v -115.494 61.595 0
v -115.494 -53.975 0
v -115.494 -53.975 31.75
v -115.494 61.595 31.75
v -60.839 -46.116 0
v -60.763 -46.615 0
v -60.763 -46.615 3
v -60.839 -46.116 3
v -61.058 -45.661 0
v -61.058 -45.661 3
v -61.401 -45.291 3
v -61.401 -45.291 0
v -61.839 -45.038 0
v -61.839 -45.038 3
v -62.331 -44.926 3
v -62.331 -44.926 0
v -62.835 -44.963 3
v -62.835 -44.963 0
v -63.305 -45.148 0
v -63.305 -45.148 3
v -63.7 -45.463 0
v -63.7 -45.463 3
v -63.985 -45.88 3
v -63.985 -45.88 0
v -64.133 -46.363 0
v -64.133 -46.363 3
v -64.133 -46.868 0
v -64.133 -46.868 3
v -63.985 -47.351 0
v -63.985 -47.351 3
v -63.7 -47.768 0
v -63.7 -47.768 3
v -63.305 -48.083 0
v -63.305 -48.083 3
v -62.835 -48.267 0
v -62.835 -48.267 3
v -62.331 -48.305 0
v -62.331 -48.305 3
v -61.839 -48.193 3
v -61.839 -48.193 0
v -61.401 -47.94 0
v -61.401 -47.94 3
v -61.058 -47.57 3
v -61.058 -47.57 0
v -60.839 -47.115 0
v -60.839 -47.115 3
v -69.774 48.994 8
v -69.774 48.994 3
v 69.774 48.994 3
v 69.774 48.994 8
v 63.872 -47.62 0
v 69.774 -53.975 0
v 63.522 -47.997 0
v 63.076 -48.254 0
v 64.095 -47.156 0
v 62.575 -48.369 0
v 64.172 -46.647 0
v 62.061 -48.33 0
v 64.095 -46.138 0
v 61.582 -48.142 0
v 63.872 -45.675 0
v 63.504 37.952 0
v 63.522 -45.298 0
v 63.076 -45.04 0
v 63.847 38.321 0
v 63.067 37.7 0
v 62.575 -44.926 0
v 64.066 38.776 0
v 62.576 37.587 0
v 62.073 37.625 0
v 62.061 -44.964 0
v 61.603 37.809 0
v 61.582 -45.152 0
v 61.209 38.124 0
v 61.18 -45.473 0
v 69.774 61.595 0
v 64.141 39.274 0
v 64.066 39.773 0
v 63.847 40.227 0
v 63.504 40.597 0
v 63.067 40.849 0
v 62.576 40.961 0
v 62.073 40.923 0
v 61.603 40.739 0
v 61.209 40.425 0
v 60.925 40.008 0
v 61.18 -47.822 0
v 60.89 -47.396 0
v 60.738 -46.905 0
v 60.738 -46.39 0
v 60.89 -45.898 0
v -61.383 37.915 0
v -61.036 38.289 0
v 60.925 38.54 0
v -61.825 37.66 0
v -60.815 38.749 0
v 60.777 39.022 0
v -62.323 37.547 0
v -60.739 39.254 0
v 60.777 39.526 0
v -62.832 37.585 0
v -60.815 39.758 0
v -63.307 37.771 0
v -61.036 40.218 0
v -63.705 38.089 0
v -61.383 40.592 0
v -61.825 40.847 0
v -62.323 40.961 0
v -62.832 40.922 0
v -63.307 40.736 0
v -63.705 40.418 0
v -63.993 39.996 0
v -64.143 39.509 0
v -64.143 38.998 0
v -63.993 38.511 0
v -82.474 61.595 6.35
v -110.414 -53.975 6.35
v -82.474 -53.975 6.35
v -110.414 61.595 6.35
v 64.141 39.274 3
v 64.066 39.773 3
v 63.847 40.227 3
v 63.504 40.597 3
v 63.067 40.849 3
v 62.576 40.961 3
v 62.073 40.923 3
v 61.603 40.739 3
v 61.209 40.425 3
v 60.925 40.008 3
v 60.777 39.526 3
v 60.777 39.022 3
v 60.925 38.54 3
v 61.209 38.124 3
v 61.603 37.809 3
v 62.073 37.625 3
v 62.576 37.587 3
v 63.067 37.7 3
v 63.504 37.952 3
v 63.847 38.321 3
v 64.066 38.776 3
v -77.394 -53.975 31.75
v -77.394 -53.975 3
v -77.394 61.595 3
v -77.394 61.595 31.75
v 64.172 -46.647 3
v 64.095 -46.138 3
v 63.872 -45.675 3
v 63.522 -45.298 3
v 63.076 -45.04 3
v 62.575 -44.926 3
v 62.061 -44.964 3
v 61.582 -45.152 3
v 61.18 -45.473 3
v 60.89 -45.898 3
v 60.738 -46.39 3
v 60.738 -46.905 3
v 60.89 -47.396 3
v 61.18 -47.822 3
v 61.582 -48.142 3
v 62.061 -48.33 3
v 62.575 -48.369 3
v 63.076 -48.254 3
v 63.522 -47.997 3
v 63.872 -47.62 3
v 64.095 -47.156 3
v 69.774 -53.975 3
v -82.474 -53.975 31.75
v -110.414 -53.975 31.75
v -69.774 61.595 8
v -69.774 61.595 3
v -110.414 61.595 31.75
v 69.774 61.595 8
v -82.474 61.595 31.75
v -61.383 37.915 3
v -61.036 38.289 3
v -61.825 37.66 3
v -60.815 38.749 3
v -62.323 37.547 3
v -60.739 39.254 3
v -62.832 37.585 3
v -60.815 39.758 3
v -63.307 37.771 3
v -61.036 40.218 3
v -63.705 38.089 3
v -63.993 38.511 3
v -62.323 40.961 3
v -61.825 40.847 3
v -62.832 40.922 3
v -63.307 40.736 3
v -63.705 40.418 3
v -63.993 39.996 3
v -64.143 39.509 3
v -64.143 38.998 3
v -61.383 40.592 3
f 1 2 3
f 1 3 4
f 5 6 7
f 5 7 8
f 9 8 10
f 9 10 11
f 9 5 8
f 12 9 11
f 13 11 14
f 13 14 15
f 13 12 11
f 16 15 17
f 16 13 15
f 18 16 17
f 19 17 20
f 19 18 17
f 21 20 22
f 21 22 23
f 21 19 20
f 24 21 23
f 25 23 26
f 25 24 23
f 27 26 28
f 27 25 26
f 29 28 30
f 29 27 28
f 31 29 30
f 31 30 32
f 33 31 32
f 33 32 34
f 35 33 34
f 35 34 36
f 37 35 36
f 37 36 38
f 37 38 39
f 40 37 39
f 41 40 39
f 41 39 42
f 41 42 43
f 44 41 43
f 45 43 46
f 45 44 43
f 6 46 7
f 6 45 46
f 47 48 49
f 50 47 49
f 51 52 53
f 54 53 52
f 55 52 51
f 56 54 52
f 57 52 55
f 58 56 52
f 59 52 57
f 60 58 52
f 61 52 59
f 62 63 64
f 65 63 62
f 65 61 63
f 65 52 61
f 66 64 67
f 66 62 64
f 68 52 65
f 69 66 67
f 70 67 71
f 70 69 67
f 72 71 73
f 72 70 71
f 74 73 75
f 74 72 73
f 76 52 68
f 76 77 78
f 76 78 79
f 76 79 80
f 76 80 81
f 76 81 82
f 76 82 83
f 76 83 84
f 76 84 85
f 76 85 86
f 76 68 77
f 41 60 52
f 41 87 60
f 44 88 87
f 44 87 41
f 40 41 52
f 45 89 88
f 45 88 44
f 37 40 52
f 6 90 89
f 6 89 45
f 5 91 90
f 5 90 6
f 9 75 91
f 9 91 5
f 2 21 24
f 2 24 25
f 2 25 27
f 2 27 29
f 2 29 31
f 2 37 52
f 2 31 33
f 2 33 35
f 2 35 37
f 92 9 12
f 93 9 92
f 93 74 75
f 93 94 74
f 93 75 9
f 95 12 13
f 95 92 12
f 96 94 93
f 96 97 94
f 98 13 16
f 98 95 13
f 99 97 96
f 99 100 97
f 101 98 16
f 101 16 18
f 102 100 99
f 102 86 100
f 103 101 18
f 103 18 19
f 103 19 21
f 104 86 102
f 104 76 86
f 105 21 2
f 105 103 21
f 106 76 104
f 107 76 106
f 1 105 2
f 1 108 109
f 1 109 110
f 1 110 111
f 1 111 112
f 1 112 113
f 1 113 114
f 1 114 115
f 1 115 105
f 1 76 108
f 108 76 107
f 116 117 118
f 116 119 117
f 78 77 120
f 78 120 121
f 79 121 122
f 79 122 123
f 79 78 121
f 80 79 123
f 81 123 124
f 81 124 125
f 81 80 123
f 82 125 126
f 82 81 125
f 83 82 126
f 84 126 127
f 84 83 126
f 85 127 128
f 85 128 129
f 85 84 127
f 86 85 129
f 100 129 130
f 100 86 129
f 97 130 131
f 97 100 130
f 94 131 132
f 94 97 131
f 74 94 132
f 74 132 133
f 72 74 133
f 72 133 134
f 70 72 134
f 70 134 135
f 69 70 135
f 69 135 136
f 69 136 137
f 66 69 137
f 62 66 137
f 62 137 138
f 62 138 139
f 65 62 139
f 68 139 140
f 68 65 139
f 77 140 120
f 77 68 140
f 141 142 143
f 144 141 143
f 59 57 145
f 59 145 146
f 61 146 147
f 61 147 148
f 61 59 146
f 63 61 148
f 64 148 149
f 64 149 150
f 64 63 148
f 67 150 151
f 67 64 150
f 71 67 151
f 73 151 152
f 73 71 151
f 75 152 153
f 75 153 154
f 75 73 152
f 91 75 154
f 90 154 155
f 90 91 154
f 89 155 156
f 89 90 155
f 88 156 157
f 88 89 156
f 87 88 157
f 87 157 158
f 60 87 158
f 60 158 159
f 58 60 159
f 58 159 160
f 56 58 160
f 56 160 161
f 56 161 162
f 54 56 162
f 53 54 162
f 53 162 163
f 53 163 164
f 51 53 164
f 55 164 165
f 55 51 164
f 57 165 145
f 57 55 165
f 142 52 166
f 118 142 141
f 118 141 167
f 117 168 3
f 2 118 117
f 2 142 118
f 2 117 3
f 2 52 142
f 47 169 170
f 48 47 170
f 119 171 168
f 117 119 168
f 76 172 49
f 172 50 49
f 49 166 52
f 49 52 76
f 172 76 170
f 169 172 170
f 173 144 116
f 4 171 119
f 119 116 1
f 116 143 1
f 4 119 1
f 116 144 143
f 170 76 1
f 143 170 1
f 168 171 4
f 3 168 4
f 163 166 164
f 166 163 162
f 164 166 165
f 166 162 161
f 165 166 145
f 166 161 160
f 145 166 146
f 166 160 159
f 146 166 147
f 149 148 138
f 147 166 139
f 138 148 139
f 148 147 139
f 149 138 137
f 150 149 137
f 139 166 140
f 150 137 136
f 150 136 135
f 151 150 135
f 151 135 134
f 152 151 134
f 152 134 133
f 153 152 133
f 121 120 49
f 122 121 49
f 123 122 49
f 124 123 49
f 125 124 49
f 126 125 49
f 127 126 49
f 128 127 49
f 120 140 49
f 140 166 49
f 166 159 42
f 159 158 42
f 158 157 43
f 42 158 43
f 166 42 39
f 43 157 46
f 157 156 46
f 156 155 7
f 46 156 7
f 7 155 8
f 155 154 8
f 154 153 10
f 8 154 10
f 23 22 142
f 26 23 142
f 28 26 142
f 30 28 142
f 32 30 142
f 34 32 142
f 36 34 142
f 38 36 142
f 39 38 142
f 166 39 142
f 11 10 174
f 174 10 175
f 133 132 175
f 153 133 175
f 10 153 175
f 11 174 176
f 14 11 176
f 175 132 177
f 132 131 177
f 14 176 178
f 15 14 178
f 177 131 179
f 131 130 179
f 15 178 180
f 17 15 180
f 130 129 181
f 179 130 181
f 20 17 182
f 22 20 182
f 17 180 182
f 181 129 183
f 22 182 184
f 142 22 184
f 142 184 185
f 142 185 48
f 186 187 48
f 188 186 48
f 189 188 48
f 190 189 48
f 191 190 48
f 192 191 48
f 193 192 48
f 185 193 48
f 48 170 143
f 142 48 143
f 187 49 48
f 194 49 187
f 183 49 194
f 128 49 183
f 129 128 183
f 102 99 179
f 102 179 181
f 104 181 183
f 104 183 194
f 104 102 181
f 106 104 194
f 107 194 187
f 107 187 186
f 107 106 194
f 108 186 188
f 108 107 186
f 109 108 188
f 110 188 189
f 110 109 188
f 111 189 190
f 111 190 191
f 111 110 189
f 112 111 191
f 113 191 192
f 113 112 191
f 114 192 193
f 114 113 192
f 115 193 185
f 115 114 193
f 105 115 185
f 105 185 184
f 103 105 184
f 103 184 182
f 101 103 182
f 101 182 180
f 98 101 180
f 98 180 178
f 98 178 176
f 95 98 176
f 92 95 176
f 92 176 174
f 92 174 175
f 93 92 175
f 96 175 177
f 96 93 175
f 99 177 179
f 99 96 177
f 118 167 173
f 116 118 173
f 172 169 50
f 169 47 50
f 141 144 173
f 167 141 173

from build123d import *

# Parameters (mm, degrees)
SKETCH2_W           = 139.548362388
SKETCH2_H           = 106.68
SKETCH2_R           = 1.694422917
SKETCH2_R_2         = 1.72646965
SKETCH2_R_3         = 1.691560161
SKETCH2_R_4         = 1.711798923
BOSS_EXTRUDE1_DEPTH = 3
SKETCH3_W           = 139.548362388
SKETCH3_H           = 3.711398725
BOSS_EXTRUDE3_DEPTH = 5
SKETCH5_W           = 139.548362388
SKETCH5_H           = 8
BOSS_EXTRUDE4_DEPTH = 8.89
SKETCH11_W          = 7.62
SKETCH11_H          = 115.57
BOSS_EXTRUDE6_DEPTH = 3
SKETCH12_W          = 38.1
SKETCH12_H          = 115.57
BOSS_EXTRUDE7_DEPTH = 31.75
CUT_EXTRUDE5_DEPTH  = 25.4


with BuildPart() as part:
    # Sketch2 → Boss-Extrude1 (new body)
    with BuildSketch(Plane.XY):
        with Locations((0, -0.635)):
            Rectangle(SKETCH2_W, SKETCH2_H)
        with Locations((-62.457904908, -46.615338173)):
            Circle(SKETCH2_R, mode=Mode.SUBTRACT)
        with Locations((62.445492634, -46.647315498)):
            Circle(SKETCH2_R_2, mode=Mode.SUBTRACT)
        with Locations((62.449204631, 39.274150641)):
            Circle(SKETCH2_R_3, mode=Mode.SUBTRACT)
        with Locations((-62.450661347, 39.253558779)):
            Circle(SKETCH2_R_4, mode=Mode.SUBTRACT)
    extrude(amount=BOSS_EXTRUDE1_DEPTH)

    # Sketch3 → Boss-Extrude3 (add)
    with BuildSketch(Plane.XY.offset(3)):
        with Locations((0, 50.849300638)):
            Rectangle(SKETCH3_W, SKETCH3_H)
    extrude(amount=BOSS_EXTRUDE3_DEPTH)

    # Sketch5 → Boss-Extrude4 (add)
    with BuildSketch(Plane(origin=(0, 52.705, 0), x_dir=(1, 0, 0), z_dir=(0, 1, 0))):
        with Locations((0, -4)):
            Rectangle(SKETCH5_W, SKETCH5_H)
    extrude(amount=BOSS_EXTRUDE4_DEPTH)

    # Sketch11 → Boss-Extrude6 (add)
    with BuildSketch(Plane(origin=(0, 0, 0), x_dir=(-1, 0, 0), z_dir=(0, 0, -1))):
        with Locations((73.584181194, 3.81)):
            Rectangle(SKETCH11_W, SKETCH11_H)
    extrude(amount=-BOSS_EXTRUDE6_DEPTH)

    # Sketch12 → Boss-Extrude7 (add)
    with BuildSketch(Plane(origin=(0, 0, 0), x_dir=(-1, 0, 0), z_dir=(0, 0, -1))):
        with Locations((96.444181194, 3.81)):
            Rectangle(SKETCH12_W, SKETCH12_H)
    extrude(amount=-BOSS_EXTRUDE7_DEPTH)

    # Sketch13 → Cut-Extrude5 (cut)
    with BuildSketch(Plane.XY.offset(31.75)):
        Polygon((-110.414181194, -48.895), (-110.414181194, -53.975), (-82.474181194, -53.975), (-82.474181194, -48.895), (-82.474181194, 56.515), (-82.474181194, 61.595), (-110.414181194, 61.595), (-110.414181194, 56.515), align=None)
    extrude(amount=-CUT_EXTRUDE5_DEPTH, mode=Mode.SUBTRACT)


solid = part.part
